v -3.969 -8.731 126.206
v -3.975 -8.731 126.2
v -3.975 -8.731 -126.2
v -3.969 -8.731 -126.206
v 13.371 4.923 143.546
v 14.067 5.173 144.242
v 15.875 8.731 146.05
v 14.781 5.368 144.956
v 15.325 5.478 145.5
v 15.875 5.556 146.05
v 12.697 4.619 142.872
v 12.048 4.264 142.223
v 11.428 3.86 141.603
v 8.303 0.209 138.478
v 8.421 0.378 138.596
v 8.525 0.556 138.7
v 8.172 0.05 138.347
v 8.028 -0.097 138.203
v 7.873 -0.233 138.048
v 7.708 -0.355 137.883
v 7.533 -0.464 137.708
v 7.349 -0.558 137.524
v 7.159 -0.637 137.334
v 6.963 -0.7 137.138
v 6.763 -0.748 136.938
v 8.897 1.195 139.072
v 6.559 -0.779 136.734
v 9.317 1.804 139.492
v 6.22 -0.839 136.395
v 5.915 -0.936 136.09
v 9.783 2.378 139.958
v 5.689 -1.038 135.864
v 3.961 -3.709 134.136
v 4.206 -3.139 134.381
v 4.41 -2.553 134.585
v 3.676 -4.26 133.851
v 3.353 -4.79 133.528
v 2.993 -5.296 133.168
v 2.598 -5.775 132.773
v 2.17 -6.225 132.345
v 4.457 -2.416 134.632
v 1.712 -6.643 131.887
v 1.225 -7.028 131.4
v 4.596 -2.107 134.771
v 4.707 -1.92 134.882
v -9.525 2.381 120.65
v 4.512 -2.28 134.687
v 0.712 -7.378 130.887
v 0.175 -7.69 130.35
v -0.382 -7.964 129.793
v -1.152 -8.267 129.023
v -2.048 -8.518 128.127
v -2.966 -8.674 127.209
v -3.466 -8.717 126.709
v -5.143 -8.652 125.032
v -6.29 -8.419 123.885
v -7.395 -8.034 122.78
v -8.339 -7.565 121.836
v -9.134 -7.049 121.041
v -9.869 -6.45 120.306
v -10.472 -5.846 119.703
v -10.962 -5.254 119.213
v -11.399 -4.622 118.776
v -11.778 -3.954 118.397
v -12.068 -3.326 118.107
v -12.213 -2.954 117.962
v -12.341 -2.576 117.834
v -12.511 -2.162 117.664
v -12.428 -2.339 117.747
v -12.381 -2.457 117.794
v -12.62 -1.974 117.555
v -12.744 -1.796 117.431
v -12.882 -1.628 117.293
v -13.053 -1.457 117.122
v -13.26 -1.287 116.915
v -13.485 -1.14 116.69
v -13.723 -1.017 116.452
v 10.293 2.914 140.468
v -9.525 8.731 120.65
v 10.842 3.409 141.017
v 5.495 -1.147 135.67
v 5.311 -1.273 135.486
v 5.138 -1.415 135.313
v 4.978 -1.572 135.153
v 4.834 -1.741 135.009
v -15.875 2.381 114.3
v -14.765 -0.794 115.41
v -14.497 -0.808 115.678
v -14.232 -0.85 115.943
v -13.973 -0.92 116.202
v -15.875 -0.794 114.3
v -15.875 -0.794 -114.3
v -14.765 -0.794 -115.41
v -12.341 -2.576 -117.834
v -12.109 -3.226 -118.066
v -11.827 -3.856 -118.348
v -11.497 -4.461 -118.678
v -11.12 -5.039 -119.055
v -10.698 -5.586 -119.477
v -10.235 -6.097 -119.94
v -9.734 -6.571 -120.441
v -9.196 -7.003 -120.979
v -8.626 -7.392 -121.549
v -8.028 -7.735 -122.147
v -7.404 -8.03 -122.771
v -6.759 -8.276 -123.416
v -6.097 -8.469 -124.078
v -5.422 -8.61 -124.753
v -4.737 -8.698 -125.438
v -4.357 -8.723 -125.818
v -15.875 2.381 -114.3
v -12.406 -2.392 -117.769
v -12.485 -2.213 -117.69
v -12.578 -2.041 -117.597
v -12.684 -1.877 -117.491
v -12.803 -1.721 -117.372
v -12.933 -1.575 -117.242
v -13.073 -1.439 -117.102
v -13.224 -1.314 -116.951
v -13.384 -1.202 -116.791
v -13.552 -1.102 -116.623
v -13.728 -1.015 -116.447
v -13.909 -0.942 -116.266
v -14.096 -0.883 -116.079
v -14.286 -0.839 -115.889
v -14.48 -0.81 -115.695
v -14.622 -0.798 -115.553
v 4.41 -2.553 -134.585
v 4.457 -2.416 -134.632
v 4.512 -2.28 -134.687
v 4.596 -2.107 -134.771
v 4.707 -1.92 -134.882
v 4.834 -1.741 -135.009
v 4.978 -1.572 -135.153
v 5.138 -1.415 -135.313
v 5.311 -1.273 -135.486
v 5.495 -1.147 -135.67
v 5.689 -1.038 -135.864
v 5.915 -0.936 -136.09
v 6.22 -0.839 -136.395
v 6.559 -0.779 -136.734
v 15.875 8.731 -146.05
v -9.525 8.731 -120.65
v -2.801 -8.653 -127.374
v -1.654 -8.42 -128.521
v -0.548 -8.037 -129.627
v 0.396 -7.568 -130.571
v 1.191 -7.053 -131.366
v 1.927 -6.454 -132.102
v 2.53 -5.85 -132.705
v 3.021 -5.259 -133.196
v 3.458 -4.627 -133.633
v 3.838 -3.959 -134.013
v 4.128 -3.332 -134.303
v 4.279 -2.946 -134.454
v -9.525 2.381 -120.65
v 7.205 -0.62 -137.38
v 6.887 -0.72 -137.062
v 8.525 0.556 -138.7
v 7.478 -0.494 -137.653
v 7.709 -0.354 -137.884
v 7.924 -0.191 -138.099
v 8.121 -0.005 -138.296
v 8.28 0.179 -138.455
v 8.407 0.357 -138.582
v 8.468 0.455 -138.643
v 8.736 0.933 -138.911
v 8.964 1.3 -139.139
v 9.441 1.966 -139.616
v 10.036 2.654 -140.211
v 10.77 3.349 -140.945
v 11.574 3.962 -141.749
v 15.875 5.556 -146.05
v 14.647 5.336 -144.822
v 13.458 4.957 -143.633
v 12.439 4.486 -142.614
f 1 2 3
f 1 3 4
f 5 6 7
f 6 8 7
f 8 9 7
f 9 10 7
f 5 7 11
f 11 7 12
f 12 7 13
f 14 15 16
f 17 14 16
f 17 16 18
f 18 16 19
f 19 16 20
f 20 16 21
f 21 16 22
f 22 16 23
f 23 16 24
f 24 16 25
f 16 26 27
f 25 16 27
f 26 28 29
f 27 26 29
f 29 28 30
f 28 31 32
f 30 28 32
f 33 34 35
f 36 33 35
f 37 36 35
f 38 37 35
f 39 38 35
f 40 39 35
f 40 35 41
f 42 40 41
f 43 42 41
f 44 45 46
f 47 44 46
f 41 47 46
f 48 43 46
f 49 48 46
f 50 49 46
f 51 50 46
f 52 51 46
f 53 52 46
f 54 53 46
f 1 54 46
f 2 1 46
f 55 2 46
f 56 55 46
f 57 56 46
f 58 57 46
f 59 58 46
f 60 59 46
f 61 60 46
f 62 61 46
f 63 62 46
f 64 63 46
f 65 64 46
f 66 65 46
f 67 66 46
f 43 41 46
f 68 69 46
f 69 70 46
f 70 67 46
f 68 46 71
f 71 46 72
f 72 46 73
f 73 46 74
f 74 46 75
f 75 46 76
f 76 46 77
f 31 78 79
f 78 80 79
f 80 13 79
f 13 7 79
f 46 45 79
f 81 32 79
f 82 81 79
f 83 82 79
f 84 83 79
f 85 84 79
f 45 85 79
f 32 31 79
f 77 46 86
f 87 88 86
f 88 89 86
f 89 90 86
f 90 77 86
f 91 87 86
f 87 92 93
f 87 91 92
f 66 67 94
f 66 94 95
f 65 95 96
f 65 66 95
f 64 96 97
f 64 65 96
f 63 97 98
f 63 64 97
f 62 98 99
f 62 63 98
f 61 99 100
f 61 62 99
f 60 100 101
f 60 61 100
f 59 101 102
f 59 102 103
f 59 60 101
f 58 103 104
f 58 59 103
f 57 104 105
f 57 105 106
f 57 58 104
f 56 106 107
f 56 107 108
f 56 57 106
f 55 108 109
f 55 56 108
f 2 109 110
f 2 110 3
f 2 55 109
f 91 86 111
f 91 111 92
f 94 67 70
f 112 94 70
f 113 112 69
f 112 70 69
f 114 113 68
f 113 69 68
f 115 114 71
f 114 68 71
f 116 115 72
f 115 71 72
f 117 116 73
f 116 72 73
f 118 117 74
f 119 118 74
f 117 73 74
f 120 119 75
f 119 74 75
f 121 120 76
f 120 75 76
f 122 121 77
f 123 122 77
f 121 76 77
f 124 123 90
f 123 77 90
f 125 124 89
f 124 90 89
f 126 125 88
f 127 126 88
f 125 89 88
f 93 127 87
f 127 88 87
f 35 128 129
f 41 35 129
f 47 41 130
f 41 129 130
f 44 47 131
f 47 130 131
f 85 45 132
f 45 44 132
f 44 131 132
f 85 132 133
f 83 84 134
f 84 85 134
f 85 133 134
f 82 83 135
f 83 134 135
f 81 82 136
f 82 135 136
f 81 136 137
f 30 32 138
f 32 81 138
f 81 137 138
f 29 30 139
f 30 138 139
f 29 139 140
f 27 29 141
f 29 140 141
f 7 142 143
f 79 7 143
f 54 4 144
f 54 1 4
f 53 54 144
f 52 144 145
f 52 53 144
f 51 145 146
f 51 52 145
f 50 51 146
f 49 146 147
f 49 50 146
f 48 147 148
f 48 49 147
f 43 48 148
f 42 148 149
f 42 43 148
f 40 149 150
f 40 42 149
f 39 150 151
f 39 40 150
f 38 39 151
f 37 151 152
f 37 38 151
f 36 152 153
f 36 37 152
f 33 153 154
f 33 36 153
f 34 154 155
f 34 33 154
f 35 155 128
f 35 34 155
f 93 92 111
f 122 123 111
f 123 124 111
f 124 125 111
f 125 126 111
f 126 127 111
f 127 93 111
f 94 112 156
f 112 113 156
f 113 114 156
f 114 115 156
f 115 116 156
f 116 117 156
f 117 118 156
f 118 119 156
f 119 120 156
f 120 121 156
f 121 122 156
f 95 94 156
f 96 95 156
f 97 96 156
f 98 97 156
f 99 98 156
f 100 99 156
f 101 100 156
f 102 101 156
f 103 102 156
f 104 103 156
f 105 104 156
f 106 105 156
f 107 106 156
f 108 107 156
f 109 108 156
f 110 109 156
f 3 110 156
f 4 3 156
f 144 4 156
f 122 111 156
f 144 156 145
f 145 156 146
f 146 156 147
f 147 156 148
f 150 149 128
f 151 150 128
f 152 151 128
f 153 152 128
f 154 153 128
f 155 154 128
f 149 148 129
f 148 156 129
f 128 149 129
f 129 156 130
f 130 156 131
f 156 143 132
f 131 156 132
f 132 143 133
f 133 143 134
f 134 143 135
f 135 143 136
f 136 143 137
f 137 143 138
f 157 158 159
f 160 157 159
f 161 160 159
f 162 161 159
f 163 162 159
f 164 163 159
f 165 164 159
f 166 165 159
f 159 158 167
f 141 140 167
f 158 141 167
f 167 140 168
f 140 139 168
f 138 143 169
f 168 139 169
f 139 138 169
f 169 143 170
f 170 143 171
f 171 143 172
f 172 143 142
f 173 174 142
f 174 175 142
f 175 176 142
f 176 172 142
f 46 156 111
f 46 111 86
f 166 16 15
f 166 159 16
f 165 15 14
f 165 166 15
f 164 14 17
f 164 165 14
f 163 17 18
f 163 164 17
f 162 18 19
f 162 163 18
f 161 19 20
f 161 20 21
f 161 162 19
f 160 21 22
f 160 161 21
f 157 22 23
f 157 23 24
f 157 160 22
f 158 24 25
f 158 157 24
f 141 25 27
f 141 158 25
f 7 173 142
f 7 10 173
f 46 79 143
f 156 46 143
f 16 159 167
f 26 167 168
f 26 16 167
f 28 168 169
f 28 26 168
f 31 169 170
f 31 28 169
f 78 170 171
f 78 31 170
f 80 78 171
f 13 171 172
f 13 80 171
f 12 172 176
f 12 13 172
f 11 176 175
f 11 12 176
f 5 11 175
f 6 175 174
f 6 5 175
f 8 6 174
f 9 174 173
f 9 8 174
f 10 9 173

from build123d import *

# Parameters (mm, degrees)
F1_DEPTH = 146.05
F2_R     = 2.54
F3_R     = 2.54
F4_R     = 2.54
F6_DEPTH = 17.4635001
F8_DEPTH = 6.35


# Not quite as in the source:
# - ends of sketch curves that miss each other by under 0.0002 mm in the source are joined


with BuildPart() as f1:
    # F0 (on Top) → F1 (new body, symmetric)
    with BuildSketch(Plane.XY):
        with BuildLine():
            Line((15.875, 5.55625), (15.875, 8.73125))
            Line((15.875, 8.73125), (-15.875, 8.73125))
            Line((-15.875, 8.73125), (-15.875, -0.79375))
            Line((-15.875, -0.79375), (-12.7, -0.79375))
            ThreePointArc((-12.7, -0.79375), (-9.8710707302, -6.4481459867), (-3.9751, -8.73125))
            Line((-3.9751, -8.73125), (-3.96875, -8.73125))
            ThreePointArc((-3.96875, -8.73125), (1.9312218072, -6.4502821485), (4.7625, -0.79375))
            Line((4.7625, -0.79375), (7.9375, -0.79375))
            ThreePointArc((7.9375, -0.79375), (10.9883747468, 3.5285940665), (15.875, 5.55625))
        make_face()
    extrude(amount=F1_DEPTH, both=True)

    # F2
    f2_edges = [f1.edges().sort_by_distance(p)[0] for p in [
        (7.9375, -0.79375, 0),
    ]]
    fillet(f2_edges, radius=F2_R)

    # F3
    f3_edges = [f1.edges().sort_by_distance(p)[0] for p in [
        (-12.7, -0.79375, 0),
    ]]
    fillet(f3_edges, radius=F3_R)

    # F4
    f4_edges = [f1.edges().sort_by_distance(p)[0] for p in [
        (4.7625, -0.79375, 0),
    ]]
    fillet(f4_edges, radius=F4_R)

    # F5 (on face) → F6 (cut, through all)
    with BuildSketch(Plane(origin=(0, 8.73125, 0), x_dir=(-1, 0, 0), z_dir=(0, 1, 0))):
        Polygon((15.875, 146.05), (-15.875, 146.05), (15.875, 114.3), align=None)
        Polygon((15.875, -114.3), (-15.875, -146.05), (15.875, -146.05), align=None)
    extrude(amount=-F6_DEPTH, mode=Mode.SUBTRACT)

    # F7 (on face) → F8 (cut)
    with BuildSketch(Plane(origin=(0, 8.73125, 0), x_dir=(-1, 0, 0), z_dir=(0, 1, 0))):
        Polygon((9.525, 120.65), (9.525, -120.65), (15.875, -114.3), (15.875, 114.3), align=None)
    extrude(amount=-F8_DEPTH, mode=Mode.SUBTRACT)


solid = f1.part
